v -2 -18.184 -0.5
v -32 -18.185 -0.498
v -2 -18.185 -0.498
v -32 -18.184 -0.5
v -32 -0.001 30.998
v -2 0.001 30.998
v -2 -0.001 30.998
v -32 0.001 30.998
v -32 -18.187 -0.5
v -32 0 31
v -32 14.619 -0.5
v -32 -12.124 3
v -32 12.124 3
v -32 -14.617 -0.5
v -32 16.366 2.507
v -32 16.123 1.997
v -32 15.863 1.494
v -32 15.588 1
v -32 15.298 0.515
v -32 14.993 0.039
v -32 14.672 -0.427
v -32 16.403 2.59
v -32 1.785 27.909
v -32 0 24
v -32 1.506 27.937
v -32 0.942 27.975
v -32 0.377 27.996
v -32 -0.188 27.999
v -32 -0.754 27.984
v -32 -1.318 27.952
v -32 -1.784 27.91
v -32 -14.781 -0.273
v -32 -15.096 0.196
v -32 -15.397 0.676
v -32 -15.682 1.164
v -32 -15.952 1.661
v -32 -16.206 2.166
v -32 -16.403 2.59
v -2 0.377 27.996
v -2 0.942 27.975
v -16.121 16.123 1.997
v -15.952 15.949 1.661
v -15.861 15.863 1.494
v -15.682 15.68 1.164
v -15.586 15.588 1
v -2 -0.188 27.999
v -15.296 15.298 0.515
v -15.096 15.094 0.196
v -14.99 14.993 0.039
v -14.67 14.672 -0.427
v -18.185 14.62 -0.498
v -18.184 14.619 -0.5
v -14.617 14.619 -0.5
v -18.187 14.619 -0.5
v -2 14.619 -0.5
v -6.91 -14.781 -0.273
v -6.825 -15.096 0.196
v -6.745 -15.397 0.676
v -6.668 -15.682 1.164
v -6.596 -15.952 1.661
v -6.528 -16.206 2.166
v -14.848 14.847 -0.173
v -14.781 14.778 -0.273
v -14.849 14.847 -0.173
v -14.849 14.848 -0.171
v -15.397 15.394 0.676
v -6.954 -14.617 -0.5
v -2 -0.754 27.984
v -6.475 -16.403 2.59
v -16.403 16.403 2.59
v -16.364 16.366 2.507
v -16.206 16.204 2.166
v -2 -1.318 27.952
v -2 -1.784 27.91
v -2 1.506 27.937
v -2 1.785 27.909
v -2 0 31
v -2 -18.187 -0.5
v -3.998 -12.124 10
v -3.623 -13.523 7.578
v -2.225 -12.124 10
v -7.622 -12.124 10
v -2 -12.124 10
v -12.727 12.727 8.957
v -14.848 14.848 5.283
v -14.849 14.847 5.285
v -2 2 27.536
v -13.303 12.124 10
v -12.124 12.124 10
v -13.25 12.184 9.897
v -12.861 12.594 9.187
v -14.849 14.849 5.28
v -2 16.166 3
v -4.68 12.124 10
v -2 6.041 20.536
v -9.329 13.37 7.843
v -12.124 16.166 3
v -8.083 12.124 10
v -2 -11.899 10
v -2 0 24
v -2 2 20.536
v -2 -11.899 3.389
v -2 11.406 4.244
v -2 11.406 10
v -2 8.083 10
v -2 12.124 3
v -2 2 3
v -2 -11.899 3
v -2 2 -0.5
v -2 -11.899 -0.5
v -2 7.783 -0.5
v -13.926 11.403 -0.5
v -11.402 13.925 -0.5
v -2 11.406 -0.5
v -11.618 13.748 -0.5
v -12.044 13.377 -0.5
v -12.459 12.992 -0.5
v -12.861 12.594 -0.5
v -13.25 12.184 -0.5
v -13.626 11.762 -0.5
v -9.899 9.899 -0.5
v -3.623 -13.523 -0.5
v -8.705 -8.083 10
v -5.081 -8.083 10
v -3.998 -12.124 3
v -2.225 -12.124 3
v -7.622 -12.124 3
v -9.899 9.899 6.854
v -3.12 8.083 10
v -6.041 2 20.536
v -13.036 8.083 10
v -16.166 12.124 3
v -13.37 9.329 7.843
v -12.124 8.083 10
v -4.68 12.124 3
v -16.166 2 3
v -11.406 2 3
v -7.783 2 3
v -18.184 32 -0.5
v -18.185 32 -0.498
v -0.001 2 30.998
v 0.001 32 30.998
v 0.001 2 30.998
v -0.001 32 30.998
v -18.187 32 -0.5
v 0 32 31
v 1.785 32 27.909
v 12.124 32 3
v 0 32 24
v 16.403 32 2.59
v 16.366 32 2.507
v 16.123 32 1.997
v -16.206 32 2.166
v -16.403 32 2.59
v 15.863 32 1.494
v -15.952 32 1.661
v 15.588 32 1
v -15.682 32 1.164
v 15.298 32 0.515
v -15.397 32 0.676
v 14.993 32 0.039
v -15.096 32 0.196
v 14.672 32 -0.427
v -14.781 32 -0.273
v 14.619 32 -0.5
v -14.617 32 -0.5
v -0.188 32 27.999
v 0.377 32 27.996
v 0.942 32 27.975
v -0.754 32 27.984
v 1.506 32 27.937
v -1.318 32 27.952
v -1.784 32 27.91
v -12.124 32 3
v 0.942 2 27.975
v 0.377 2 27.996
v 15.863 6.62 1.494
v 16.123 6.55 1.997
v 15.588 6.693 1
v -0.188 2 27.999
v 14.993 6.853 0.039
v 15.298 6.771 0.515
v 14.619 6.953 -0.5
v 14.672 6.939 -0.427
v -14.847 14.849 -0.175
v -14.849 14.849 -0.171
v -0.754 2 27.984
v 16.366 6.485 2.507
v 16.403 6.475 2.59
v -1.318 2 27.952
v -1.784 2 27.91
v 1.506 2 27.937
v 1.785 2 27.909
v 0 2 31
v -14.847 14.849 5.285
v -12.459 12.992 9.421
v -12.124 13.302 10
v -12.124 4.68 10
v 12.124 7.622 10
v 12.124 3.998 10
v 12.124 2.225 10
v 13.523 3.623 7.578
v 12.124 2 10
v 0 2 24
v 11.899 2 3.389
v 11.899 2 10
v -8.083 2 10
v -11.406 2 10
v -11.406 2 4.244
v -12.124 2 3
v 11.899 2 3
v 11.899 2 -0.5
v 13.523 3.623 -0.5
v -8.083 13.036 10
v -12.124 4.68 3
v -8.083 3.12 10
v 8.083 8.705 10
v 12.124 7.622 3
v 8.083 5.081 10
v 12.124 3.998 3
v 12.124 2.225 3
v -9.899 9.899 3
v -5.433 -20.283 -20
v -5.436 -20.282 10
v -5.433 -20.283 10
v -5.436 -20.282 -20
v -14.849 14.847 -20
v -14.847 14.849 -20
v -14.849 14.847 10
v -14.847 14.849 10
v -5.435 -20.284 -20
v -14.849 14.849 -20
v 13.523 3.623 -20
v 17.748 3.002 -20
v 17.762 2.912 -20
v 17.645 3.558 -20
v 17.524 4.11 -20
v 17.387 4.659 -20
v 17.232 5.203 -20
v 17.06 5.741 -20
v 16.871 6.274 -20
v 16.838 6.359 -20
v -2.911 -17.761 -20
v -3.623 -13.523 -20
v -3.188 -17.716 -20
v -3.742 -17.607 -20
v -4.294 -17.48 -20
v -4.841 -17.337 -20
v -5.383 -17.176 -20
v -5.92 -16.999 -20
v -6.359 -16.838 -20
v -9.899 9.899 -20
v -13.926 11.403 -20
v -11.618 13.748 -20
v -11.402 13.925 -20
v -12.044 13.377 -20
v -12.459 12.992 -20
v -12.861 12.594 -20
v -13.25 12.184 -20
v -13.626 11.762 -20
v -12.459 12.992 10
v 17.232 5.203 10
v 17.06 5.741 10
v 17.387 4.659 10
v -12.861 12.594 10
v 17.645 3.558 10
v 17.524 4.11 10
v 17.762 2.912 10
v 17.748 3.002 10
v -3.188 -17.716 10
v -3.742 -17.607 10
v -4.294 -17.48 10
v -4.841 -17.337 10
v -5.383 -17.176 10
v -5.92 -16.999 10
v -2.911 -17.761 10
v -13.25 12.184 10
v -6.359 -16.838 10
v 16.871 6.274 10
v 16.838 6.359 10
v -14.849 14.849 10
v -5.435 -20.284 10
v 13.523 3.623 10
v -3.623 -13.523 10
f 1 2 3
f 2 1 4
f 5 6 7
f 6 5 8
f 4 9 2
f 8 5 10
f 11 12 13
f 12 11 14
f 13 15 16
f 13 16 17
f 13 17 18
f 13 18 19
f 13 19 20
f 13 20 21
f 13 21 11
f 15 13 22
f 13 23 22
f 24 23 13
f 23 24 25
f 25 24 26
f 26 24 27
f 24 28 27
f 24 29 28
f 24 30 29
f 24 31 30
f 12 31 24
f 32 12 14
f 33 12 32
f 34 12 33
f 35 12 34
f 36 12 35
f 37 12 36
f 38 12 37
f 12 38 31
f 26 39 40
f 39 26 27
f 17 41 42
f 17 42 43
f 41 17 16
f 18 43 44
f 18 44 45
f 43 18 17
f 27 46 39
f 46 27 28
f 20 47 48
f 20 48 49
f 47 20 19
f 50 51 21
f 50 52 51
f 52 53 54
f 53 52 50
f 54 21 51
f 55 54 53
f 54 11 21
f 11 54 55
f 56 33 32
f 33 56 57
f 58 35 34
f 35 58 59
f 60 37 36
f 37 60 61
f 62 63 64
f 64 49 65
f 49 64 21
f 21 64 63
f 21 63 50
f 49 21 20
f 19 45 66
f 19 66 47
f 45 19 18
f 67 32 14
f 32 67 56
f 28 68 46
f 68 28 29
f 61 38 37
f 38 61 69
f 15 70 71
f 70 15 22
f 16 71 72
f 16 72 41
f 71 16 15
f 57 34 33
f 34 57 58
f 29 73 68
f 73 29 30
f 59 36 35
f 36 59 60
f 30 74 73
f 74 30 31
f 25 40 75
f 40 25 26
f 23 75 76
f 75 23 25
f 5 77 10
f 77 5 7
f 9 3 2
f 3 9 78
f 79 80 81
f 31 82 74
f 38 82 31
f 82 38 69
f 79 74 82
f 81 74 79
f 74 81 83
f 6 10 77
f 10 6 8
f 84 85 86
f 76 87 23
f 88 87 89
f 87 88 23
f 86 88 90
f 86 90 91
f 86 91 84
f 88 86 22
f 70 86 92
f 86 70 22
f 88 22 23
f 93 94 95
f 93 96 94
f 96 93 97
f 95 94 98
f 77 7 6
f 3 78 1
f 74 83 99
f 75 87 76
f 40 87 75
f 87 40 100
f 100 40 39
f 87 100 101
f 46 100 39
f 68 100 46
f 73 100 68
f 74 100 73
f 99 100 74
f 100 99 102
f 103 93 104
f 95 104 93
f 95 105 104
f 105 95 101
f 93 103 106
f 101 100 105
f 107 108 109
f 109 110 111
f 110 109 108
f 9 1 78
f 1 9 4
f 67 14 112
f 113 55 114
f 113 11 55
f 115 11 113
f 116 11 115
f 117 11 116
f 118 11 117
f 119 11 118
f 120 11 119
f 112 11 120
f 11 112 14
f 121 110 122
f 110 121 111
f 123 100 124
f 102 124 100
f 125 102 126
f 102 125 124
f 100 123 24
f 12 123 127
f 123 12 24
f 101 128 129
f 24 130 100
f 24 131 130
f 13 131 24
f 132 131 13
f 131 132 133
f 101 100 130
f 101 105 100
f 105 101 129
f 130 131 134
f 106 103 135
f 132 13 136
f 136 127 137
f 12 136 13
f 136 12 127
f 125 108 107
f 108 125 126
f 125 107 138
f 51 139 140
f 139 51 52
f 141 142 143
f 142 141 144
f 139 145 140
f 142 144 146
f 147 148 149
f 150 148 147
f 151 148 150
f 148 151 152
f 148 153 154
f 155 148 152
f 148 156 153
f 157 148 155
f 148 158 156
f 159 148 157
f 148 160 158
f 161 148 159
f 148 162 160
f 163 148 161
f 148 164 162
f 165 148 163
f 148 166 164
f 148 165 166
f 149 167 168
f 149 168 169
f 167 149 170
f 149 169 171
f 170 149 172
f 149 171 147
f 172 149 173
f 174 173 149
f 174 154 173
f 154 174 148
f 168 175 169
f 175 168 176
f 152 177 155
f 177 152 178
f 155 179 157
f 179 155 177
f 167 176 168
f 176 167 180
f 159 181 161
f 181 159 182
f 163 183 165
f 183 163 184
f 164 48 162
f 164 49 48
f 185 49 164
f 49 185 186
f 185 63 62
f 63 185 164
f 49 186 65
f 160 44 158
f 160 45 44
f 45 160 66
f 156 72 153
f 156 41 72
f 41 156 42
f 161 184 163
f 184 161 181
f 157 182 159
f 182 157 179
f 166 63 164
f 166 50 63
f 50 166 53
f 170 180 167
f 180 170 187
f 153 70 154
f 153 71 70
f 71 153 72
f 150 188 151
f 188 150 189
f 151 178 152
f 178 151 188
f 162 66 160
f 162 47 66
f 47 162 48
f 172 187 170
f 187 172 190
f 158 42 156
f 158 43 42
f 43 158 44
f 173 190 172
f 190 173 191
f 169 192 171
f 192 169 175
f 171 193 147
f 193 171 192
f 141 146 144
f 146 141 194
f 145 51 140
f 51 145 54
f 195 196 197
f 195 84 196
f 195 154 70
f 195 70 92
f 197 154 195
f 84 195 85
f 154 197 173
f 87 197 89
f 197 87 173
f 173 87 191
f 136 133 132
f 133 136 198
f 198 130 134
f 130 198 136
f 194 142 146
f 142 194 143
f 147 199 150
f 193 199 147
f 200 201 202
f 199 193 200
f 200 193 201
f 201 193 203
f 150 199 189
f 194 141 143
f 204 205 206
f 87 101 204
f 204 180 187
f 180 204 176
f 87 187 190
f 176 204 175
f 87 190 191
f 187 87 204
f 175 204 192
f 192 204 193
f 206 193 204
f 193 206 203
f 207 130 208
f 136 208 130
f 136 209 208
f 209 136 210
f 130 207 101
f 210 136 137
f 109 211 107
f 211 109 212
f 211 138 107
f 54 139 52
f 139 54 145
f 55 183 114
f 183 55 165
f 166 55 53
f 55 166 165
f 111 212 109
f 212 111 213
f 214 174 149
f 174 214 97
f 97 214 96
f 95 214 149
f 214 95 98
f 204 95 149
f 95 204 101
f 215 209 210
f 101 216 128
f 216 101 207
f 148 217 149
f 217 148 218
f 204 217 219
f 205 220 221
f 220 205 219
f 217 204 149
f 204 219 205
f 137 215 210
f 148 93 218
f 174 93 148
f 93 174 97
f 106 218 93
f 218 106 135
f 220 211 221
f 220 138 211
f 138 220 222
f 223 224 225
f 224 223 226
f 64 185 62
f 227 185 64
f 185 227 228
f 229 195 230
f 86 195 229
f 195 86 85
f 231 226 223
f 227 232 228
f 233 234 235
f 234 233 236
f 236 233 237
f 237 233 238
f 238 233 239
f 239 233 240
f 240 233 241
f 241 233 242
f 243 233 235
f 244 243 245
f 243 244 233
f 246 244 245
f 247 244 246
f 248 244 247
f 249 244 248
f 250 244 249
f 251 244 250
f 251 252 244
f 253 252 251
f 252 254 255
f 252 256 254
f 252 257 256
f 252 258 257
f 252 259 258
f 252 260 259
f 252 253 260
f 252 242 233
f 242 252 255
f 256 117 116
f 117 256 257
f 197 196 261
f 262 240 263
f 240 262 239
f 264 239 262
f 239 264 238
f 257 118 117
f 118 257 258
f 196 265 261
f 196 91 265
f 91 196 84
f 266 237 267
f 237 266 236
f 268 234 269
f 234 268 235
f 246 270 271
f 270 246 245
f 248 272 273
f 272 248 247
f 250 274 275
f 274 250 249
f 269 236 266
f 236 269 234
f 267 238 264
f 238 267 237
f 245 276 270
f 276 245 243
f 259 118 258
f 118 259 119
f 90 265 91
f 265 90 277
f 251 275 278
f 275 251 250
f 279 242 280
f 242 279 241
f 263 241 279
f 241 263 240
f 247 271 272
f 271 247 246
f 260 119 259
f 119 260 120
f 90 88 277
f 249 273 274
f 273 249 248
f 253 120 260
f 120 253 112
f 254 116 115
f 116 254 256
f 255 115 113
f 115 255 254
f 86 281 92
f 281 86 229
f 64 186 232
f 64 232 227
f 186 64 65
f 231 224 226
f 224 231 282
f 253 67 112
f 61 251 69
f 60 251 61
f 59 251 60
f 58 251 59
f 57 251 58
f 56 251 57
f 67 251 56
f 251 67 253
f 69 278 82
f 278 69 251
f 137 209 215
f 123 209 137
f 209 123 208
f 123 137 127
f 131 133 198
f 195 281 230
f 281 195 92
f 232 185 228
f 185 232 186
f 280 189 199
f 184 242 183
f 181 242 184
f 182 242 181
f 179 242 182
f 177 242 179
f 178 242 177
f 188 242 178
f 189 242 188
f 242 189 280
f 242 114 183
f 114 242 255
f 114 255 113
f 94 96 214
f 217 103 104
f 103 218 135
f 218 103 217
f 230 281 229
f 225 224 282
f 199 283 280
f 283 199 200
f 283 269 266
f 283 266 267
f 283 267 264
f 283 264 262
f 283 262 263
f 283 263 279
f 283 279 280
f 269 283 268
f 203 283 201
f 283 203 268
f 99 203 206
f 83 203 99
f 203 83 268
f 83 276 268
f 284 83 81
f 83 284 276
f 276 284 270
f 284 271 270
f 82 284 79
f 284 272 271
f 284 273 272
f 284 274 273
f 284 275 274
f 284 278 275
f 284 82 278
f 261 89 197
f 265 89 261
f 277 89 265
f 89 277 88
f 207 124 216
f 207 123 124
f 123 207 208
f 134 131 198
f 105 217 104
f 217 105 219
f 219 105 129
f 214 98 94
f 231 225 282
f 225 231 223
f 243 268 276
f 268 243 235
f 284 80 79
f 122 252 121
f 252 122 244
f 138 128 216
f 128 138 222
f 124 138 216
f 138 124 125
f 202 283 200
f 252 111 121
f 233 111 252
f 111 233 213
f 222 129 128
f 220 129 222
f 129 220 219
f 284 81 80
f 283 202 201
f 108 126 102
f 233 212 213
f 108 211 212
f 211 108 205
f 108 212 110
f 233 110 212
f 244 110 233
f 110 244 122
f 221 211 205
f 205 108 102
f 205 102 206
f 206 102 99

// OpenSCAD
// 40 - 3.4 = 36.6
// 42 is circumcircle of above

module tri() {
  difference() {
    cylinder($fn=3, h=30, d=42);
      
    // make hollow
    translate([0,0,-1])
    cylinder($fn=3, h=35, d=28);
      
    // round corners
    difference() {
      cylinder($fn=200, h=32, d=42);
      cylinder($fn=200, h=32, d=36);
    }
    
  }
  
}

translate([-32, 0, 10])
rotate([0,0,90])
rotate([90,0,])
rotate([0,0,-30])
tri();

translate([0, 32, 10])
rotate([90,0,])
rotate([0,0,-30])
tri();


translate([0, 0, -20])
rotate([0,0,15])
tri();
